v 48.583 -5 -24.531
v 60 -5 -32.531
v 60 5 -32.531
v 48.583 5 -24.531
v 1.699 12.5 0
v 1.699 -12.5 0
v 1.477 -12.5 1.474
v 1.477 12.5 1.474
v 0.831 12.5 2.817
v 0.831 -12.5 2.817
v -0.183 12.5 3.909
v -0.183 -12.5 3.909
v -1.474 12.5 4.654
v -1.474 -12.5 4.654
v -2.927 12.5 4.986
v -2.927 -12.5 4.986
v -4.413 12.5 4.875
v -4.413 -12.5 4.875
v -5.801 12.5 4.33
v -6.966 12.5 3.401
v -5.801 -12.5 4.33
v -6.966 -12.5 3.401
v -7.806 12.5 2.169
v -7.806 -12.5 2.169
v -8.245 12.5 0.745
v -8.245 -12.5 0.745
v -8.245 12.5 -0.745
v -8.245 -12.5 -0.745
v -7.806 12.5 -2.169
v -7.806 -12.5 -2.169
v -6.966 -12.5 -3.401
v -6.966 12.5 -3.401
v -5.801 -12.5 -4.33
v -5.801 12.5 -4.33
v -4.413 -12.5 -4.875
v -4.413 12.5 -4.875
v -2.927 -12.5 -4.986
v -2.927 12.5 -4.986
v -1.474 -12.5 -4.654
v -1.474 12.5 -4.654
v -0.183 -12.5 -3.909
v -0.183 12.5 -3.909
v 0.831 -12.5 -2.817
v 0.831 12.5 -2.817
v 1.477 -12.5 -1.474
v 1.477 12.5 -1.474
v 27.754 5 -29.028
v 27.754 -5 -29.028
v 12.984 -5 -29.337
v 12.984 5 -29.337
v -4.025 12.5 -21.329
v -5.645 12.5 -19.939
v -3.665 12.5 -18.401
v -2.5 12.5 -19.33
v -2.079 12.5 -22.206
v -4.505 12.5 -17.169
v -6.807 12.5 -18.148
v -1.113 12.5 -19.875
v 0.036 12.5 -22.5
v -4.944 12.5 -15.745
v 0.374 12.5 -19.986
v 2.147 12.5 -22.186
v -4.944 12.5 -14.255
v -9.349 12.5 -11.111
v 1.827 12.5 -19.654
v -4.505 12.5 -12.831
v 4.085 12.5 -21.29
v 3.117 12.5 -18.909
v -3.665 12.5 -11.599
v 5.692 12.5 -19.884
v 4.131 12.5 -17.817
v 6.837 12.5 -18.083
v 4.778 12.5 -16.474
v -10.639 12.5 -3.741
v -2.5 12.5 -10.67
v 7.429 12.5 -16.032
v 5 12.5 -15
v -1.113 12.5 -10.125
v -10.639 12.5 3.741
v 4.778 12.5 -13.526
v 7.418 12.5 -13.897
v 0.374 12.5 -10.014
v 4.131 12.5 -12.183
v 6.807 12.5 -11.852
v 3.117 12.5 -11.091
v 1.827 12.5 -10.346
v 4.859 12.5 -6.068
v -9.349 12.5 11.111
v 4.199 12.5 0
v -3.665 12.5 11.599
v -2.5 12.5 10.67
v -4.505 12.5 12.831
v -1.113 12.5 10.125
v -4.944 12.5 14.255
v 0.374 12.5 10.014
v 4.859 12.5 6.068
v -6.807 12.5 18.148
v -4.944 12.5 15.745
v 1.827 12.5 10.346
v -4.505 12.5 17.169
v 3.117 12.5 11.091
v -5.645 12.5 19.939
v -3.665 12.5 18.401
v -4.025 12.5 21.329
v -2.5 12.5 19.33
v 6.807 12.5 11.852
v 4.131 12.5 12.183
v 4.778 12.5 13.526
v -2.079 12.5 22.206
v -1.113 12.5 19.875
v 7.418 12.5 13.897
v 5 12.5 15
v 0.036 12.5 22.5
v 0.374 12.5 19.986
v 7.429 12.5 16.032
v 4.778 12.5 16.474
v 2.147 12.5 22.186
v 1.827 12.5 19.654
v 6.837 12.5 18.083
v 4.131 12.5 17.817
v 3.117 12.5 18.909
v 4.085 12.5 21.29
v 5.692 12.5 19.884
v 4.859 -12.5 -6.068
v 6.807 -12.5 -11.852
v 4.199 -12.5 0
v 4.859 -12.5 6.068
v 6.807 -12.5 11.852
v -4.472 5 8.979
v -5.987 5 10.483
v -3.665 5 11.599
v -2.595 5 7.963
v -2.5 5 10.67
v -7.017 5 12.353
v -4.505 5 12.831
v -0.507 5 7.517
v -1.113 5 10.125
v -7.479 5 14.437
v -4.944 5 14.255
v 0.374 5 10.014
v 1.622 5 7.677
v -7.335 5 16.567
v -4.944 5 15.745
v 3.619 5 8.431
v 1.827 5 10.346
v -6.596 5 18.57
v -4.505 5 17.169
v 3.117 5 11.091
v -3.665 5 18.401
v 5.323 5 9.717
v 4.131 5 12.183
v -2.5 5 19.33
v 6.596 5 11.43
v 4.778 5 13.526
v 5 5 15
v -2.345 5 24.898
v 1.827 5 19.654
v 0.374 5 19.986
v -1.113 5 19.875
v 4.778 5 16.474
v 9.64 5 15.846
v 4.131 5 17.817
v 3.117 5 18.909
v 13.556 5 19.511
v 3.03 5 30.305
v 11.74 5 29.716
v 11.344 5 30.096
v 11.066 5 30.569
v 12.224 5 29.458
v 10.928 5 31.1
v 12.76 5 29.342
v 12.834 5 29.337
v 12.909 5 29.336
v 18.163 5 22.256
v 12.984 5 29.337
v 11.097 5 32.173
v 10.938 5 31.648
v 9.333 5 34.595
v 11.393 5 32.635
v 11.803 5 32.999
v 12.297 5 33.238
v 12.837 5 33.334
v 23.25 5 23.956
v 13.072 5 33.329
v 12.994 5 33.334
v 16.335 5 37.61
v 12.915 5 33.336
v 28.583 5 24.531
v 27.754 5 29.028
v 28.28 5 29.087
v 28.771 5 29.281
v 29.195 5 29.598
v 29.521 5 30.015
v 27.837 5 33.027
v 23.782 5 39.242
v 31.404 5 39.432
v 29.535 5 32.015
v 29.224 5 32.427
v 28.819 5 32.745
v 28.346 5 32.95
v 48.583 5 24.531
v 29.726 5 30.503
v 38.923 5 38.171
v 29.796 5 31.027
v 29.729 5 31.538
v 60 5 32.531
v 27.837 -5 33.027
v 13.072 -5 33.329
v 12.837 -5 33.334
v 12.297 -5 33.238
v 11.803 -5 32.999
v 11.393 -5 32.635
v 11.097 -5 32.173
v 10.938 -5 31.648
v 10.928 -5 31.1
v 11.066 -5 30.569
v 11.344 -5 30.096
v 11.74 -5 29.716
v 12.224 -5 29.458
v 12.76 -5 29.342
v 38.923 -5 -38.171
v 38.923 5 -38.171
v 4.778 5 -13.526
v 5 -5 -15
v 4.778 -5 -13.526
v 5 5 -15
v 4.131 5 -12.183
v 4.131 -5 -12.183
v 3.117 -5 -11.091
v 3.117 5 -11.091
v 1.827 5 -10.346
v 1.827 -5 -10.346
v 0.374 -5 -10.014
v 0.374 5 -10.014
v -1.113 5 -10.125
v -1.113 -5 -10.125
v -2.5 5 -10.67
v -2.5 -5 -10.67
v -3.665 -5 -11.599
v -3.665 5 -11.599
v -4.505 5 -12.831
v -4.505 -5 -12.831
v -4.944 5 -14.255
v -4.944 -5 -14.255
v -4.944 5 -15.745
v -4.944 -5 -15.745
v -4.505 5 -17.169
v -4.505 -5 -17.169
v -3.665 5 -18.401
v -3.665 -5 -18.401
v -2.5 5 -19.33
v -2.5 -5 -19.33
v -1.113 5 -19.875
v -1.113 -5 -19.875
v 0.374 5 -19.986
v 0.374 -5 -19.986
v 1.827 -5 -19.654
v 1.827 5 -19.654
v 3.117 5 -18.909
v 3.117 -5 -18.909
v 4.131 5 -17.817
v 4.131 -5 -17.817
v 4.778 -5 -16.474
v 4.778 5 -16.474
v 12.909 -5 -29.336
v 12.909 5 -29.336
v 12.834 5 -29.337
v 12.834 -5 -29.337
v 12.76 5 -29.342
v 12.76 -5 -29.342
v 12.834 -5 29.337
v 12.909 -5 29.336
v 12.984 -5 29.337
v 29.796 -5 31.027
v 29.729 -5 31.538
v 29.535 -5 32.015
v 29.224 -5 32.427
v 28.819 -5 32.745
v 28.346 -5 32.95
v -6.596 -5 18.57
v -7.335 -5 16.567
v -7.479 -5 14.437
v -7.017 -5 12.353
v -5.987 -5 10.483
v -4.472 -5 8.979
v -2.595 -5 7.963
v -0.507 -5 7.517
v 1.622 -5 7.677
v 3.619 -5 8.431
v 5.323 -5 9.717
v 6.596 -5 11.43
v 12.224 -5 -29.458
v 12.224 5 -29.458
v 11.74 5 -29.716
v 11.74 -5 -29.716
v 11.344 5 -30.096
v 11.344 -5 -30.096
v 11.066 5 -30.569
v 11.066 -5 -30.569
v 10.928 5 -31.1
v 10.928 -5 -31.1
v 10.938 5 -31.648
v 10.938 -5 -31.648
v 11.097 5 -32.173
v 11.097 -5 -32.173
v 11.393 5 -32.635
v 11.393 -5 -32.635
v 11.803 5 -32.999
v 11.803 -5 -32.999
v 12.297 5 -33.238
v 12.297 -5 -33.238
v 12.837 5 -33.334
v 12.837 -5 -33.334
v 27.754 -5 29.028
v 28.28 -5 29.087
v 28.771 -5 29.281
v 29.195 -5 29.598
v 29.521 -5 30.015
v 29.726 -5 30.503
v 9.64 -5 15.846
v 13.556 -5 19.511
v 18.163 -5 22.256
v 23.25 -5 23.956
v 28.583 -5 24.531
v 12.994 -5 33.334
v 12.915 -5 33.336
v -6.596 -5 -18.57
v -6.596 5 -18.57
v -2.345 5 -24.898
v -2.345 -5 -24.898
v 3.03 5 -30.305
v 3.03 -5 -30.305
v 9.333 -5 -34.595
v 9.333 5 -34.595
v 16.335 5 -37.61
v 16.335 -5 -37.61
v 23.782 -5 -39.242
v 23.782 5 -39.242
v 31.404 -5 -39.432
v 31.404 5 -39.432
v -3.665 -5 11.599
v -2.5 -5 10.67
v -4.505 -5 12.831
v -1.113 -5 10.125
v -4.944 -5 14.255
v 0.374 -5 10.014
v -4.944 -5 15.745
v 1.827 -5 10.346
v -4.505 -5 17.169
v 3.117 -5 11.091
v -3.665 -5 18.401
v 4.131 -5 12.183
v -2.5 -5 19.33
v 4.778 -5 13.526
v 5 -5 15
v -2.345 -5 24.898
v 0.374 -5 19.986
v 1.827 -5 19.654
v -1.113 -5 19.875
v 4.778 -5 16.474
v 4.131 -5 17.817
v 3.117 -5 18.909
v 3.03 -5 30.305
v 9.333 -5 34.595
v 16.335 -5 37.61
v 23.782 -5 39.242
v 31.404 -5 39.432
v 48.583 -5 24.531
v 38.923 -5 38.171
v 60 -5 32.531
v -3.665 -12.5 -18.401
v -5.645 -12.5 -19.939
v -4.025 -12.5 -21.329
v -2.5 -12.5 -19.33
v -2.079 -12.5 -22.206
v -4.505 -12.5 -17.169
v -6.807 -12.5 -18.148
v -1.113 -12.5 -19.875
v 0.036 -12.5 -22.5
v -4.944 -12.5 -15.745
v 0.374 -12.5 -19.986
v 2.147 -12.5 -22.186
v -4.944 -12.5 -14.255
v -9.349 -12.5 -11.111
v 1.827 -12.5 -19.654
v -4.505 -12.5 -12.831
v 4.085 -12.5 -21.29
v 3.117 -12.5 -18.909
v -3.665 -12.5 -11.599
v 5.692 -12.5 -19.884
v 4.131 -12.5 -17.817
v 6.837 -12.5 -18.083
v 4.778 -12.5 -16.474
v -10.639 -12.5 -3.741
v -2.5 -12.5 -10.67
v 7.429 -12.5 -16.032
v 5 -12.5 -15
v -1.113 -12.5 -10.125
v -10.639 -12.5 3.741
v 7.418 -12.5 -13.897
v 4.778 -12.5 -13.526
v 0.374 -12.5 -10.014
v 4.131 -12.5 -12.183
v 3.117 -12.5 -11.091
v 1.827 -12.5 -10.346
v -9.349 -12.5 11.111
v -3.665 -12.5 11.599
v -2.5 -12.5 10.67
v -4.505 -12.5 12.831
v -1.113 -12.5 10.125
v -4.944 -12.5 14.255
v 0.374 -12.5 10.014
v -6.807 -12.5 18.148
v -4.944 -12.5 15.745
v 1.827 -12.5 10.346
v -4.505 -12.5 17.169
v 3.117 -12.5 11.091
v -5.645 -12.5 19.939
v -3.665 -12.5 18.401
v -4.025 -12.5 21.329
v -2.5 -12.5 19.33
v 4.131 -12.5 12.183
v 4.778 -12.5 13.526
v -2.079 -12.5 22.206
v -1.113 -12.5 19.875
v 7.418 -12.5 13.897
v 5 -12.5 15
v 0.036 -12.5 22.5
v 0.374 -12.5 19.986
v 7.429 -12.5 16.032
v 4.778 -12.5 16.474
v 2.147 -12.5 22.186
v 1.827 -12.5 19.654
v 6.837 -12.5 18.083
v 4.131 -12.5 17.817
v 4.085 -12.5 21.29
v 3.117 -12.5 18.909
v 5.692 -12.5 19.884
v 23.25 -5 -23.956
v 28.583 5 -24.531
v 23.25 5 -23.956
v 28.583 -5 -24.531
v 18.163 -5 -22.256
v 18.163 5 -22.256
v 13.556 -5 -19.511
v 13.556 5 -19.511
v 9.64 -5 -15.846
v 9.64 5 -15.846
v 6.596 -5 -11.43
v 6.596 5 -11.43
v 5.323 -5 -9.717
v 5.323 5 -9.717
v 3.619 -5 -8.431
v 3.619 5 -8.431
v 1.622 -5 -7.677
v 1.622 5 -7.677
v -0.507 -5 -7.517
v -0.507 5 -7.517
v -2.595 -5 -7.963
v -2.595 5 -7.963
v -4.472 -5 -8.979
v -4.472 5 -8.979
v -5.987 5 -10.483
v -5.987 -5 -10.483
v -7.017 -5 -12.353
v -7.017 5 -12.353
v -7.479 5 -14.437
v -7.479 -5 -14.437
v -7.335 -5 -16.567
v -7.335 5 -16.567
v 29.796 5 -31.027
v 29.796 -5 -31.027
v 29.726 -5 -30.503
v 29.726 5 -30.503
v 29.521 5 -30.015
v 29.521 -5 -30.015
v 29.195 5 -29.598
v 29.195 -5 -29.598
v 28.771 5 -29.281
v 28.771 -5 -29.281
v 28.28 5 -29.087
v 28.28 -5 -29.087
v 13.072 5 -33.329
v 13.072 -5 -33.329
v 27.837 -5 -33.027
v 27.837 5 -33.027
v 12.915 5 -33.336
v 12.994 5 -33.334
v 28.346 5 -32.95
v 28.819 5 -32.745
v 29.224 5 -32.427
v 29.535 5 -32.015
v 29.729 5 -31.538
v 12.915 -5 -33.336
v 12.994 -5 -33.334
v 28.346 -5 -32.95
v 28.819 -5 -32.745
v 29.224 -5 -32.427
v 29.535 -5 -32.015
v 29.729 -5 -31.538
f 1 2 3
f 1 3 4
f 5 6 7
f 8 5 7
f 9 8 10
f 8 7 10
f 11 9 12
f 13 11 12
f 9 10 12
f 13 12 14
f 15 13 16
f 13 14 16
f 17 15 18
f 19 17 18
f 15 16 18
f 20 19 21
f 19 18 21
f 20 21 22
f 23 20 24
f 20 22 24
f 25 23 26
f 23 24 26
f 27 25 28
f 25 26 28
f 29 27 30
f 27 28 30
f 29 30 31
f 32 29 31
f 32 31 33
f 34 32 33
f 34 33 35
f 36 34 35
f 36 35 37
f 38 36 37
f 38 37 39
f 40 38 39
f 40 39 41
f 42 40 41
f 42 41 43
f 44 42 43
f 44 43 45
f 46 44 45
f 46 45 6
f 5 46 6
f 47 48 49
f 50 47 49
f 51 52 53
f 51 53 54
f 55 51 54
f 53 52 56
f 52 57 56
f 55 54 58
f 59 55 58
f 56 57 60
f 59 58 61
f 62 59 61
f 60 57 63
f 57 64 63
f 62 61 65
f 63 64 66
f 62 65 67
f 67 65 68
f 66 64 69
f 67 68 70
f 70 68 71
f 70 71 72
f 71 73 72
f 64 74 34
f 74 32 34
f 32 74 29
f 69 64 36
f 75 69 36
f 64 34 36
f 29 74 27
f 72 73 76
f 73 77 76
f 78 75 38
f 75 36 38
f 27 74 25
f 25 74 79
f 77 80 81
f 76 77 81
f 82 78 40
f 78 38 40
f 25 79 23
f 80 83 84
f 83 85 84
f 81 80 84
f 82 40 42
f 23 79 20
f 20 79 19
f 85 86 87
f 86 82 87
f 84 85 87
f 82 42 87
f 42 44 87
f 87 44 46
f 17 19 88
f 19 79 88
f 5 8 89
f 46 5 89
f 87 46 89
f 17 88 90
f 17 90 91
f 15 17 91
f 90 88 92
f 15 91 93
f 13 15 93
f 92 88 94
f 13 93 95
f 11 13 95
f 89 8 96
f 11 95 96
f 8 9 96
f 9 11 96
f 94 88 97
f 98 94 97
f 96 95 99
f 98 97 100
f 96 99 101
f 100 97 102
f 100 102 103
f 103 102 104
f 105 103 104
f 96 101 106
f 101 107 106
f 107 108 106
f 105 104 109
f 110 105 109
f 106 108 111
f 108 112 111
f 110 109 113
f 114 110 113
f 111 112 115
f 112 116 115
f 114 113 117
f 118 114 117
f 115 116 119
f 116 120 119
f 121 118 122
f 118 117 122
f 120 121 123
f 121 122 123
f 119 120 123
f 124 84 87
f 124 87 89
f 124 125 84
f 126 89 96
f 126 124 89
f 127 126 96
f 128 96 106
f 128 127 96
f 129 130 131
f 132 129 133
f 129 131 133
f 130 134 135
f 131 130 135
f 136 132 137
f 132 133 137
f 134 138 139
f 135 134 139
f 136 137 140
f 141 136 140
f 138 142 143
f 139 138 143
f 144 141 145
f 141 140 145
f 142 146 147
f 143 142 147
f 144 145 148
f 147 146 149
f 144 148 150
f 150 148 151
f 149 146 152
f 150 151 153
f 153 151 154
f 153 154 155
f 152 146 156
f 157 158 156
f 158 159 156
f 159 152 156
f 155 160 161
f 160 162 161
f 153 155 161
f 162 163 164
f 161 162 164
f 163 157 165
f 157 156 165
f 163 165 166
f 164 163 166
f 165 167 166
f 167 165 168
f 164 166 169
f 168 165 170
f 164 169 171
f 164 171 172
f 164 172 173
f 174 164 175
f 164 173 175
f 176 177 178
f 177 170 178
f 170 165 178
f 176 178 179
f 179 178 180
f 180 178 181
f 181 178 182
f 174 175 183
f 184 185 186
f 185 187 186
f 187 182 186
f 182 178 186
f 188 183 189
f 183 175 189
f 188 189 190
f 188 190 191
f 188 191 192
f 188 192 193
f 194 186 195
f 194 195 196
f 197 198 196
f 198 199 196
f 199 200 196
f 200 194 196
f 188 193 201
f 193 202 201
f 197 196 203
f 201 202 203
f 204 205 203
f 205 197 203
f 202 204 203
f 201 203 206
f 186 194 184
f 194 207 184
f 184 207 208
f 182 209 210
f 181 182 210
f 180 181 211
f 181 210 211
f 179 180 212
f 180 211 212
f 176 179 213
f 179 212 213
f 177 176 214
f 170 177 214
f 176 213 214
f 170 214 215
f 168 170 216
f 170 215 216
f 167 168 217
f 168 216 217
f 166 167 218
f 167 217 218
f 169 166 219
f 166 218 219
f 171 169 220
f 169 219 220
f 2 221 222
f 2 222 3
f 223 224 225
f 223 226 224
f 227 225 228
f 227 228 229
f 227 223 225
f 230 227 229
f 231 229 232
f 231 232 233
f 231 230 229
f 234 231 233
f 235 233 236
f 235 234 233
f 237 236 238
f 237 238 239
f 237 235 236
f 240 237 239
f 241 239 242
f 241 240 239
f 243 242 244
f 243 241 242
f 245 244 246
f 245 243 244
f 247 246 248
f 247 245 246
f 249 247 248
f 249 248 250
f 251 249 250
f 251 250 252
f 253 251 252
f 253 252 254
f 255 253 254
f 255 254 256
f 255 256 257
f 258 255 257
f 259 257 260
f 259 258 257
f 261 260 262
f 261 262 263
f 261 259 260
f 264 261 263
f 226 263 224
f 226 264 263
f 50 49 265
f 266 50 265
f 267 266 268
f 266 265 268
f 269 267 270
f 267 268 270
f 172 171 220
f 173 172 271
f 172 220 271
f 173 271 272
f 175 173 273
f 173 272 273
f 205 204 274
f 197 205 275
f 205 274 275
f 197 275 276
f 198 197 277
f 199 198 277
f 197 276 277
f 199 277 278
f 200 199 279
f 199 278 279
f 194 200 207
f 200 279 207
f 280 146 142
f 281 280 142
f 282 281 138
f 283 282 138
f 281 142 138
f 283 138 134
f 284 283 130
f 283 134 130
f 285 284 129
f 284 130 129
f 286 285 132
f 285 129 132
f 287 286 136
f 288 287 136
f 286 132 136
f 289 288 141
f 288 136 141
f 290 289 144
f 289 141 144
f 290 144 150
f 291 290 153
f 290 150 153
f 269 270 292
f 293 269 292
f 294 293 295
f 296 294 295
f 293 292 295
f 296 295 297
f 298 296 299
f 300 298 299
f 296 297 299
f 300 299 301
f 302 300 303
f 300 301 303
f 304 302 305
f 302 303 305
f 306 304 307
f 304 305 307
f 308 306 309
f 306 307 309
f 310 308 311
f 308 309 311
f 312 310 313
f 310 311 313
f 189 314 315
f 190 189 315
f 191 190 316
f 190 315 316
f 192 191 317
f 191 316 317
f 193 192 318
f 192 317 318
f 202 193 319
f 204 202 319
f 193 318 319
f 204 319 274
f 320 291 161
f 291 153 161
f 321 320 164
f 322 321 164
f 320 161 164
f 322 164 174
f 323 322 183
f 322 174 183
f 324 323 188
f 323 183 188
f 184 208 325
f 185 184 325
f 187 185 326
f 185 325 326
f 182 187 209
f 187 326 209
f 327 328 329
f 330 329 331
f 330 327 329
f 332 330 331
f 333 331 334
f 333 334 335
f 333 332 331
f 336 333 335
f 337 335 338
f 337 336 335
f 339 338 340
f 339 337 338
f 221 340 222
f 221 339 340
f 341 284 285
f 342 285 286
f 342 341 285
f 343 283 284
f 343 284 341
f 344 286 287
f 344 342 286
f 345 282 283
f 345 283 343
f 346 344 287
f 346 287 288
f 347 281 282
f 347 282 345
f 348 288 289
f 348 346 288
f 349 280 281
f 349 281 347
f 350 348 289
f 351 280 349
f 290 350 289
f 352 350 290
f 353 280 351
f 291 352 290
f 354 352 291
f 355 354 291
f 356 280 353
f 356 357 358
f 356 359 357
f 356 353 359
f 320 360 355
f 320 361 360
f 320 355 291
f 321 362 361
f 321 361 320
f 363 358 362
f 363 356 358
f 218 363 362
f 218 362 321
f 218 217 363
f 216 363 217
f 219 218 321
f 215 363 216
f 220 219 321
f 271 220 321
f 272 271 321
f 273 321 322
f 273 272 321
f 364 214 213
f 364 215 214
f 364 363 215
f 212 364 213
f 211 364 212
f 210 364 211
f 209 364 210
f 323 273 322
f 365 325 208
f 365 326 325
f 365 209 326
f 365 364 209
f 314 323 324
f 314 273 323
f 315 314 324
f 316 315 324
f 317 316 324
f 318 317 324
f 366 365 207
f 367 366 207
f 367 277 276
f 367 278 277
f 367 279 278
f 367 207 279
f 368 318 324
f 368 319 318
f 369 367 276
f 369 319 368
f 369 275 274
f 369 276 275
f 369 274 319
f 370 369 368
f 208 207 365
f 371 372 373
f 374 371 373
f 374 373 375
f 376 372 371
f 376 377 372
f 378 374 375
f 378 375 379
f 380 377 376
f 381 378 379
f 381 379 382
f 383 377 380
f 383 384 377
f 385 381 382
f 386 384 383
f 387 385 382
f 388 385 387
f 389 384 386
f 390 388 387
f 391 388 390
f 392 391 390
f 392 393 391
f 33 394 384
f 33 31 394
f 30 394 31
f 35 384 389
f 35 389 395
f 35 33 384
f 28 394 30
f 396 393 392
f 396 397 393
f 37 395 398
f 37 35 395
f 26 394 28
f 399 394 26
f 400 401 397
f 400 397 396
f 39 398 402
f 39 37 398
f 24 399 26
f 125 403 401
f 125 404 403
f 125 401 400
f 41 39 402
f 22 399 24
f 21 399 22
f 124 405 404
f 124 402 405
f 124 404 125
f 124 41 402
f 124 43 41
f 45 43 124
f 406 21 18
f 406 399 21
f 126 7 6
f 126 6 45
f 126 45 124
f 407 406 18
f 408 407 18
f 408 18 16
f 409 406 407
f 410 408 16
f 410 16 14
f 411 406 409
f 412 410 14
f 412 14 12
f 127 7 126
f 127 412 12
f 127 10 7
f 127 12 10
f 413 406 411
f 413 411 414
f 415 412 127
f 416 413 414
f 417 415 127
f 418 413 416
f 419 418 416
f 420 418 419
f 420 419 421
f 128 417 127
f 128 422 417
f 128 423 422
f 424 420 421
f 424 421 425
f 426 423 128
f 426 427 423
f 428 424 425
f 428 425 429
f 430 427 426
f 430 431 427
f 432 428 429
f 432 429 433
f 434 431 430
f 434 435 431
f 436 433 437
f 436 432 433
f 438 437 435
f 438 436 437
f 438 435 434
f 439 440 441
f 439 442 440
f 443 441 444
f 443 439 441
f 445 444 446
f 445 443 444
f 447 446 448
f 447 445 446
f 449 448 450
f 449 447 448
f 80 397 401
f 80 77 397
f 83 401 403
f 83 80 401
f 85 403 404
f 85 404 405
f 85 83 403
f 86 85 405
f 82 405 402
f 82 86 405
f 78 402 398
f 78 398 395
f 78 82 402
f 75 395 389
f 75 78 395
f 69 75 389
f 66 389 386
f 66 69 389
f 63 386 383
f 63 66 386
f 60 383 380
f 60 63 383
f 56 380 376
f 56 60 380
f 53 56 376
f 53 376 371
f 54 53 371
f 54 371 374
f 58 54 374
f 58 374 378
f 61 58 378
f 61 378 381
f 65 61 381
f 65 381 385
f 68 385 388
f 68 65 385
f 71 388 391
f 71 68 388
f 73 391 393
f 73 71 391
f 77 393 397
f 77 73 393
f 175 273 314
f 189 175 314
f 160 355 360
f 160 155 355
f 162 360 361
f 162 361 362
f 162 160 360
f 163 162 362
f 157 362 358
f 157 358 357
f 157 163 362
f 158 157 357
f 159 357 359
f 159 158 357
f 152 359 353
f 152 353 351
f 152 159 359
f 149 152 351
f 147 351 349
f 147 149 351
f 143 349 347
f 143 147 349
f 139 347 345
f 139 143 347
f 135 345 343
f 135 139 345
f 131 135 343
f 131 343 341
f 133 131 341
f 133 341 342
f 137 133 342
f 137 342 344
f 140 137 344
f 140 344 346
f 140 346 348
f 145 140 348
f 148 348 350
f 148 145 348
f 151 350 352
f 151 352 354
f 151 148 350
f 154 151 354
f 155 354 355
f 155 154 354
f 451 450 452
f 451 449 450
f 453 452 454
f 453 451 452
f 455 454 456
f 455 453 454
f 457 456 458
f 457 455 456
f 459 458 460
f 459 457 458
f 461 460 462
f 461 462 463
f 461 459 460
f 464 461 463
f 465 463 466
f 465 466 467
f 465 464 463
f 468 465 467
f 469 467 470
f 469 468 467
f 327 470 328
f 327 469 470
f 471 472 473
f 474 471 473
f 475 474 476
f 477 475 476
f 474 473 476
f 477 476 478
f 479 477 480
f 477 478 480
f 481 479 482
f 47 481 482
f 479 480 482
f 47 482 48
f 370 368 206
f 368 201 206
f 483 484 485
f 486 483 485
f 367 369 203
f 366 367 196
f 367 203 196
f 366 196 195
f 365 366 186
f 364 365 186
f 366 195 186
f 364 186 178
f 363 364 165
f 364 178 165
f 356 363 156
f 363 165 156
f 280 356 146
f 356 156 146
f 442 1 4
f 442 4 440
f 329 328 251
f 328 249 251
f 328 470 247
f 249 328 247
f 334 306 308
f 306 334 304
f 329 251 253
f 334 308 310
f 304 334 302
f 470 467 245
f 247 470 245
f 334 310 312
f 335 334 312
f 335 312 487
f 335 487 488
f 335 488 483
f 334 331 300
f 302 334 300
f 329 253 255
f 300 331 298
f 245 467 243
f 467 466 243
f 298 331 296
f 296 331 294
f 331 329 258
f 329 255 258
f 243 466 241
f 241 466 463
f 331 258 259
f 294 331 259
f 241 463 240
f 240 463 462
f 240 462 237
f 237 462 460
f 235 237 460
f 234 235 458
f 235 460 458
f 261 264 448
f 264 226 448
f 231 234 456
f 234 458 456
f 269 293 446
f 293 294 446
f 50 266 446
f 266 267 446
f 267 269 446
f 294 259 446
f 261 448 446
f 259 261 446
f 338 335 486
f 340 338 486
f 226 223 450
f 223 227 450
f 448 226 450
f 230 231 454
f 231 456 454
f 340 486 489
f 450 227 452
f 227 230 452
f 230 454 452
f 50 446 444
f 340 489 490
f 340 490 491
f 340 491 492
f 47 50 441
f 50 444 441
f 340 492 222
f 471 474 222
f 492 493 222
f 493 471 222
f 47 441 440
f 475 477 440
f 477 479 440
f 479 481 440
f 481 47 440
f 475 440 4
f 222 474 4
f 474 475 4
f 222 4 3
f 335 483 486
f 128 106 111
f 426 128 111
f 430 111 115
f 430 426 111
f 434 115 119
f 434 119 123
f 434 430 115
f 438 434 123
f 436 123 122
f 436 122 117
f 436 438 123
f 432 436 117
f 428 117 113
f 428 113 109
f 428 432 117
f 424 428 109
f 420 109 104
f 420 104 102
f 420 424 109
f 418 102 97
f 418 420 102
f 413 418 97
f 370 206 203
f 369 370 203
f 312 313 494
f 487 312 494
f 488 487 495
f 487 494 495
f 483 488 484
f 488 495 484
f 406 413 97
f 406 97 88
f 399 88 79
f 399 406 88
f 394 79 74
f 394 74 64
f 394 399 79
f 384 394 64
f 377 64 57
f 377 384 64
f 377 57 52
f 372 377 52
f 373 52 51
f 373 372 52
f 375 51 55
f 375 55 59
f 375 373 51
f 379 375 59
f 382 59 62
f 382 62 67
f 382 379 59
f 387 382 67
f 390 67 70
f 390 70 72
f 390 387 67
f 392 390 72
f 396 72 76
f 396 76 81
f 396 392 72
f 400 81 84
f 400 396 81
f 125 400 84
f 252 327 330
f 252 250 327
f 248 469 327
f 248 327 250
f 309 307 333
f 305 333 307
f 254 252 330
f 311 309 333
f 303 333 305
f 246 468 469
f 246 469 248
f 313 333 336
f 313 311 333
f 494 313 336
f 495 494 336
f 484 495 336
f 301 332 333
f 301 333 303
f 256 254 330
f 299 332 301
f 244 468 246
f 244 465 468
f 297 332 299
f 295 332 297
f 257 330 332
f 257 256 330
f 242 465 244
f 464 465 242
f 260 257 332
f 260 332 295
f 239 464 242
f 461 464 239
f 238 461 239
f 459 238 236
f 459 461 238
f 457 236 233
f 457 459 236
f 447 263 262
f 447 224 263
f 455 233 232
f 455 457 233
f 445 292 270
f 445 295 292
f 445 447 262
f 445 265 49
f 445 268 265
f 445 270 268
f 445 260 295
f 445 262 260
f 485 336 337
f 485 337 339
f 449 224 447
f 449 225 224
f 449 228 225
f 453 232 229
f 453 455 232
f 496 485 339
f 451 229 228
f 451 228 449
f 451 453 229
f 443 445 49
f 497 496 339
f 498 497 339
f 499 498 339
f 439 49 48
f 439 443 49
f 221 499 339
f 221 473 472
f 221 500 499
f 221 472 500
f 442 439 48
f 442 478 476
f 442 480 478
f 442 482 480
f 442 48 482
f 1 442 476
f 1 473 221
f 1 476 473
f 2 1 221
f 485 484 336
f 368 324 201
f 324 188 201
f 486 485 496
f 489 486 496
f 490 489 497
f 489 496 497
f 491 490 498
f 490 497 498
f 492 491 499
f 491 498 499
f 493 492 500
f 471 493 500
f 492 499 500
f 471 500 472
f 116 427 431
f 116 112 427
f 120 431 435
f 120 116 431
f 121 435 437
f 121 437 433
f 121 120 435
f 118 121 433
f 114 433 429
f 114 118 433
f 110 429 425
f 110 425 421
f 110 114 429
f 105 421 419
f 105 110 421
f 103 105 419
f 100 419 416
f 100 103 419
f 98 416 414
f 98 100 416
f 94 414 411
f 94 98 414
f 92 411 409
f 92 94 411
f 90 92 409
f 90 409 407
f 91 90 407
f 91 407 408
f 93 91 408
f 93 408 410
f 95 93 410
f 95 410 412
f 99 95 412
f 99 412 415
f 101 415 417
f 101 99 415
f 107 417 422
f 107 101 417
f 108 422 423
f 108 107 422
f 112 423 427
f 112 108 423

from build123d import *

# Parameters (mm, degrees)
F0_R     = 5
F2_DEPTH = 12.5
F1_R     = 5
F3_DEPTH = 5
F5_DEPTH = 17.501
F6_R     = 5
F7_DEPTH = 25.001


with BuildPart() as f2:
    # F0 (on Front) → F2 (new body, symmetric)
    with BuildSketch(Plane.XZ):
        with BuildLine():
            ThreePointArc((6.807243, -11.851755), (4.199317, 0), (6.807243, 11.851755))
            ThreePointArc((6.807243, 11.851755), (3.148245, 21.807243), (-6.807243, 18.148245))
            ThreePointArc((-6.807243, 18.148245), (-10.800683, 0), (-6.807243, -18.148245))
            ThreePointArc((-6.807243, -18.148245), (3.148245, -21.807243), (6.807243, -11.851755))
        make_face()
        with Locations((0, -15)):
            Circle(F0_R, mode=Mode.SUBTRACT)
        with Locations((0, 15)):
            Circle(F0_R, mode=Mode.SUBTRACT)
    extrude(amount=F2_DEPTH, both=True)

    # F6 (on face) → F7 (cut, through all)
    with BuildSketch(Plane.XZ.offset(12.5)):
        with Locations((-3.300683, 0)):
            Circle(F6_R)
    extrude(amount=-F7_DEPTH, mode=Mode.SUBTRACT)


with BuildPart() as f3:
    # F1 (on Front) → F3 (new body, symmetric)
    with BuildSketch(Plane.XZ):
        with BuildLine():
            ThreePointArc((6.595982, 11.430264), (7.270484, 13.158787), (7.5, 15))
            ThreePointArc((7.5, 15), (1.841213, 22.270484), (-6.595982, 18.569736))
            ThreePointArc((-6.595982, 18.569736), (-3.569736, 8.404018), (6.595982, 11.430264))
        make_face()
        with Locations((0, 15)):
            Circle(F1_R, mode=Mode.SUBTRACT)
        with BuildLine():
            ThreePointArc((-6.595982, 18.569736), (1.841213, 22.270484), (7.5, 15))
            ThreePointArc((7.5, 15), (7.270484, 13.158787), (6.595982, 11.430264))
            ThreePointArc((6.595982, 11.430264), (15.785677, 21.007618), (28.58259, 24.531142))
            Line((28.58259, 24.531142), (48.58259, 24.531142))
            Line((48.58259, 24.531142), (60, 32.531142))
            Line((60, 32.531142), (38.922994, 38.171485))
            ThreePointArc((38.922994, 38.171485), (12.762009, 36.269531), (-6.595982, 18.569736))
        make_face()
        with BuildLine():
            ThreePointArc((-6.595982, -18.569736), (12.762009, -36.269531), (38.922994, -38.171485))
            Line((38.922994, -38.171485), (60, -32.531142))
            Line((60, -32.531142), (48.58259, -24.531142))
            Line((48.58259, -24.531142), (28.58259, -24.531142))
            ThreePointArc((28.58259, -24.531142), (15.785677, -21.007618), (6.595982, -11.430264))
            ThreePointArc((6.595982, -11.430264), (7.270484, -13.158787), (7.5, -15))
            ThreePointArc((7.5, -15), (1.841213, -22.270484), (-6.595982, -18.569736))
        make_face()
        with BuildLine():
            ThreePointArc((6.595982, -11.430264), (-3.569736, -8.404018), (-6.595982, -18.569736))
            ThreePointArc((-6.595982, -18.569736), (1.841213, -22.270484), (7.5, -15))
            ThreePointArc((7.5, -15), (7.270484, -13.158787), (6.595982, -11.430264))
        make_face()
        with Locations((0, -15)):
            Circle(F1_R, mode=Mode.SUBTRACT)
    extrude(amount=F3_DEPTH, both=True)

    # F4 (on face) → F5 (cut, through all)
    with BuildSketch(Plane.XZ.offset(5)):
        with BuildLine():
            Line((13.072276, 33.329393), (12.836771, 33.334221))
            ThreePointArc((12.836771, 33.334221), (10.913968, 31.37423), (12.759835, 29.341617))
            Line((12.759835, 29.341617), (12.983721, 29.336927))
            ThreePointArc((12.983721, 29.336927), (14.35239, 29.946498), (14.913597, 31.335697))
            ThreePointArc((14.913597, 31.335697), (14.382842, 32.69265), (13.072276, 33.329393))
        make_face()
        with BuildLine():
            ThreePointArc((13.072276, 33.329393), (12.954595, 33.335277), (12.836771, 33.334221))
            Line((12.836771, 33.334221), (13.072276, 33.329393))
        make_face()
        with BuildLine():
            Line((12.983721, 29.336927), (12.759835, 29.341617))
            ThreePointArc((12.759835, 29.341617), (12.871712, 29.336136), (12.983721, 29.336927))
        make_face()
        with BuildLine():
            Line((27.836771, 33.026675), (13.072276, 33.329393))
            ThreePointArc((13.072276, 33.329393), (14.382842, 32.69265), (14.913597, 31.335697))
            ThreePointArc((14.913597, 31.335697), (14.35239, 29.946498), (12.983721, 29.336927))
            Line((12.983721, 29.336927), (27.753889, 29.027534))
            ThreePointArc((27.753889, 29.027534), (25.796203, 31.068537), (27.836771, 33.026675))
        make_face()
        with BuildLine():
            ThreePointArc((29.795774, 31.027096), (29.224409, 32.426739), (27.836771, 33.026675))
            ThreePointArc((27.836771, 33.026675), (25.796203, 31.068537), (27.753889, 29.027534))
            ThreePointArc((27.753889, 29.027534), (29.1951, 29.59815), (29.795774, 31.027096))
        make_face()
        with BuildLine():
            Line((12.983721, -29.336927), (12.759835, -29.341617))
            ThreePointArc((12.759835, -29.341617), (10.913968, -31.37423), (12.836771, -33.334221))
            Line((12.836771, -33.334221), (13.072276, -33.329393))
            ThreePointArc((13.072276, -33.329393), (14.382842, -32.69265), (14.913597, -31.335697))
            ThreePointArc((14.913597, -31.335697), (14.35239, -29.946498), (12.983721, -29.336927))
        make_face()
        with BuildLine():
            ThreePointArc((12.983721, -29.336927), (12.871712, -29.336136), (12.759835, -29.341617))
            Line((12.759835, -29.341617), (12.983721, -29.336927))
        make_face()
        with BuildLine():
            Line((13.072276, -33.329393), (12.836771, -33.334221))
            ThreePointArc((12.836771, -33.334221), (12.954595, -33.335277), (13.072276, -33.329393))
        make_face()
        with BuildLine():
            Line((27.753889, -29.027534), (12.983721, -29.336927))
            ThreePointArc((12.983721, -29.336927), (14.35239, -29.946498), (14.913597, -31.335697))
            ThreePointArc((14.913597, -31.335697), (14.382842, -32.69265), (13.072276, -33.329393))
            Line((13.072276, -33.329393), (27.836771, -33.026675))
            ThreePointArc((27.836771, -33.026675), (25.796203, -31.068537), (27.753889, -29.027534))
        make_face()
        with BuildLine():
            ThreePointArc((29.795774, -31.027096), (29.1951, -29.59815), (27.753889, -29.027534))
            ThreePointArc((27.753889, -29.027534), (25.796203, -31.068537), (27.836771, -33.026675))
            ThreePointArc((27.836771, -33.026675), (29.224409, -32.426739), (29.795774, -31.027096))
        make_face()
    extrude(amount=-F5_DEPTH, mode=Mode.SUBTRACT)


solid = Compound([f2.part, f3.part])
